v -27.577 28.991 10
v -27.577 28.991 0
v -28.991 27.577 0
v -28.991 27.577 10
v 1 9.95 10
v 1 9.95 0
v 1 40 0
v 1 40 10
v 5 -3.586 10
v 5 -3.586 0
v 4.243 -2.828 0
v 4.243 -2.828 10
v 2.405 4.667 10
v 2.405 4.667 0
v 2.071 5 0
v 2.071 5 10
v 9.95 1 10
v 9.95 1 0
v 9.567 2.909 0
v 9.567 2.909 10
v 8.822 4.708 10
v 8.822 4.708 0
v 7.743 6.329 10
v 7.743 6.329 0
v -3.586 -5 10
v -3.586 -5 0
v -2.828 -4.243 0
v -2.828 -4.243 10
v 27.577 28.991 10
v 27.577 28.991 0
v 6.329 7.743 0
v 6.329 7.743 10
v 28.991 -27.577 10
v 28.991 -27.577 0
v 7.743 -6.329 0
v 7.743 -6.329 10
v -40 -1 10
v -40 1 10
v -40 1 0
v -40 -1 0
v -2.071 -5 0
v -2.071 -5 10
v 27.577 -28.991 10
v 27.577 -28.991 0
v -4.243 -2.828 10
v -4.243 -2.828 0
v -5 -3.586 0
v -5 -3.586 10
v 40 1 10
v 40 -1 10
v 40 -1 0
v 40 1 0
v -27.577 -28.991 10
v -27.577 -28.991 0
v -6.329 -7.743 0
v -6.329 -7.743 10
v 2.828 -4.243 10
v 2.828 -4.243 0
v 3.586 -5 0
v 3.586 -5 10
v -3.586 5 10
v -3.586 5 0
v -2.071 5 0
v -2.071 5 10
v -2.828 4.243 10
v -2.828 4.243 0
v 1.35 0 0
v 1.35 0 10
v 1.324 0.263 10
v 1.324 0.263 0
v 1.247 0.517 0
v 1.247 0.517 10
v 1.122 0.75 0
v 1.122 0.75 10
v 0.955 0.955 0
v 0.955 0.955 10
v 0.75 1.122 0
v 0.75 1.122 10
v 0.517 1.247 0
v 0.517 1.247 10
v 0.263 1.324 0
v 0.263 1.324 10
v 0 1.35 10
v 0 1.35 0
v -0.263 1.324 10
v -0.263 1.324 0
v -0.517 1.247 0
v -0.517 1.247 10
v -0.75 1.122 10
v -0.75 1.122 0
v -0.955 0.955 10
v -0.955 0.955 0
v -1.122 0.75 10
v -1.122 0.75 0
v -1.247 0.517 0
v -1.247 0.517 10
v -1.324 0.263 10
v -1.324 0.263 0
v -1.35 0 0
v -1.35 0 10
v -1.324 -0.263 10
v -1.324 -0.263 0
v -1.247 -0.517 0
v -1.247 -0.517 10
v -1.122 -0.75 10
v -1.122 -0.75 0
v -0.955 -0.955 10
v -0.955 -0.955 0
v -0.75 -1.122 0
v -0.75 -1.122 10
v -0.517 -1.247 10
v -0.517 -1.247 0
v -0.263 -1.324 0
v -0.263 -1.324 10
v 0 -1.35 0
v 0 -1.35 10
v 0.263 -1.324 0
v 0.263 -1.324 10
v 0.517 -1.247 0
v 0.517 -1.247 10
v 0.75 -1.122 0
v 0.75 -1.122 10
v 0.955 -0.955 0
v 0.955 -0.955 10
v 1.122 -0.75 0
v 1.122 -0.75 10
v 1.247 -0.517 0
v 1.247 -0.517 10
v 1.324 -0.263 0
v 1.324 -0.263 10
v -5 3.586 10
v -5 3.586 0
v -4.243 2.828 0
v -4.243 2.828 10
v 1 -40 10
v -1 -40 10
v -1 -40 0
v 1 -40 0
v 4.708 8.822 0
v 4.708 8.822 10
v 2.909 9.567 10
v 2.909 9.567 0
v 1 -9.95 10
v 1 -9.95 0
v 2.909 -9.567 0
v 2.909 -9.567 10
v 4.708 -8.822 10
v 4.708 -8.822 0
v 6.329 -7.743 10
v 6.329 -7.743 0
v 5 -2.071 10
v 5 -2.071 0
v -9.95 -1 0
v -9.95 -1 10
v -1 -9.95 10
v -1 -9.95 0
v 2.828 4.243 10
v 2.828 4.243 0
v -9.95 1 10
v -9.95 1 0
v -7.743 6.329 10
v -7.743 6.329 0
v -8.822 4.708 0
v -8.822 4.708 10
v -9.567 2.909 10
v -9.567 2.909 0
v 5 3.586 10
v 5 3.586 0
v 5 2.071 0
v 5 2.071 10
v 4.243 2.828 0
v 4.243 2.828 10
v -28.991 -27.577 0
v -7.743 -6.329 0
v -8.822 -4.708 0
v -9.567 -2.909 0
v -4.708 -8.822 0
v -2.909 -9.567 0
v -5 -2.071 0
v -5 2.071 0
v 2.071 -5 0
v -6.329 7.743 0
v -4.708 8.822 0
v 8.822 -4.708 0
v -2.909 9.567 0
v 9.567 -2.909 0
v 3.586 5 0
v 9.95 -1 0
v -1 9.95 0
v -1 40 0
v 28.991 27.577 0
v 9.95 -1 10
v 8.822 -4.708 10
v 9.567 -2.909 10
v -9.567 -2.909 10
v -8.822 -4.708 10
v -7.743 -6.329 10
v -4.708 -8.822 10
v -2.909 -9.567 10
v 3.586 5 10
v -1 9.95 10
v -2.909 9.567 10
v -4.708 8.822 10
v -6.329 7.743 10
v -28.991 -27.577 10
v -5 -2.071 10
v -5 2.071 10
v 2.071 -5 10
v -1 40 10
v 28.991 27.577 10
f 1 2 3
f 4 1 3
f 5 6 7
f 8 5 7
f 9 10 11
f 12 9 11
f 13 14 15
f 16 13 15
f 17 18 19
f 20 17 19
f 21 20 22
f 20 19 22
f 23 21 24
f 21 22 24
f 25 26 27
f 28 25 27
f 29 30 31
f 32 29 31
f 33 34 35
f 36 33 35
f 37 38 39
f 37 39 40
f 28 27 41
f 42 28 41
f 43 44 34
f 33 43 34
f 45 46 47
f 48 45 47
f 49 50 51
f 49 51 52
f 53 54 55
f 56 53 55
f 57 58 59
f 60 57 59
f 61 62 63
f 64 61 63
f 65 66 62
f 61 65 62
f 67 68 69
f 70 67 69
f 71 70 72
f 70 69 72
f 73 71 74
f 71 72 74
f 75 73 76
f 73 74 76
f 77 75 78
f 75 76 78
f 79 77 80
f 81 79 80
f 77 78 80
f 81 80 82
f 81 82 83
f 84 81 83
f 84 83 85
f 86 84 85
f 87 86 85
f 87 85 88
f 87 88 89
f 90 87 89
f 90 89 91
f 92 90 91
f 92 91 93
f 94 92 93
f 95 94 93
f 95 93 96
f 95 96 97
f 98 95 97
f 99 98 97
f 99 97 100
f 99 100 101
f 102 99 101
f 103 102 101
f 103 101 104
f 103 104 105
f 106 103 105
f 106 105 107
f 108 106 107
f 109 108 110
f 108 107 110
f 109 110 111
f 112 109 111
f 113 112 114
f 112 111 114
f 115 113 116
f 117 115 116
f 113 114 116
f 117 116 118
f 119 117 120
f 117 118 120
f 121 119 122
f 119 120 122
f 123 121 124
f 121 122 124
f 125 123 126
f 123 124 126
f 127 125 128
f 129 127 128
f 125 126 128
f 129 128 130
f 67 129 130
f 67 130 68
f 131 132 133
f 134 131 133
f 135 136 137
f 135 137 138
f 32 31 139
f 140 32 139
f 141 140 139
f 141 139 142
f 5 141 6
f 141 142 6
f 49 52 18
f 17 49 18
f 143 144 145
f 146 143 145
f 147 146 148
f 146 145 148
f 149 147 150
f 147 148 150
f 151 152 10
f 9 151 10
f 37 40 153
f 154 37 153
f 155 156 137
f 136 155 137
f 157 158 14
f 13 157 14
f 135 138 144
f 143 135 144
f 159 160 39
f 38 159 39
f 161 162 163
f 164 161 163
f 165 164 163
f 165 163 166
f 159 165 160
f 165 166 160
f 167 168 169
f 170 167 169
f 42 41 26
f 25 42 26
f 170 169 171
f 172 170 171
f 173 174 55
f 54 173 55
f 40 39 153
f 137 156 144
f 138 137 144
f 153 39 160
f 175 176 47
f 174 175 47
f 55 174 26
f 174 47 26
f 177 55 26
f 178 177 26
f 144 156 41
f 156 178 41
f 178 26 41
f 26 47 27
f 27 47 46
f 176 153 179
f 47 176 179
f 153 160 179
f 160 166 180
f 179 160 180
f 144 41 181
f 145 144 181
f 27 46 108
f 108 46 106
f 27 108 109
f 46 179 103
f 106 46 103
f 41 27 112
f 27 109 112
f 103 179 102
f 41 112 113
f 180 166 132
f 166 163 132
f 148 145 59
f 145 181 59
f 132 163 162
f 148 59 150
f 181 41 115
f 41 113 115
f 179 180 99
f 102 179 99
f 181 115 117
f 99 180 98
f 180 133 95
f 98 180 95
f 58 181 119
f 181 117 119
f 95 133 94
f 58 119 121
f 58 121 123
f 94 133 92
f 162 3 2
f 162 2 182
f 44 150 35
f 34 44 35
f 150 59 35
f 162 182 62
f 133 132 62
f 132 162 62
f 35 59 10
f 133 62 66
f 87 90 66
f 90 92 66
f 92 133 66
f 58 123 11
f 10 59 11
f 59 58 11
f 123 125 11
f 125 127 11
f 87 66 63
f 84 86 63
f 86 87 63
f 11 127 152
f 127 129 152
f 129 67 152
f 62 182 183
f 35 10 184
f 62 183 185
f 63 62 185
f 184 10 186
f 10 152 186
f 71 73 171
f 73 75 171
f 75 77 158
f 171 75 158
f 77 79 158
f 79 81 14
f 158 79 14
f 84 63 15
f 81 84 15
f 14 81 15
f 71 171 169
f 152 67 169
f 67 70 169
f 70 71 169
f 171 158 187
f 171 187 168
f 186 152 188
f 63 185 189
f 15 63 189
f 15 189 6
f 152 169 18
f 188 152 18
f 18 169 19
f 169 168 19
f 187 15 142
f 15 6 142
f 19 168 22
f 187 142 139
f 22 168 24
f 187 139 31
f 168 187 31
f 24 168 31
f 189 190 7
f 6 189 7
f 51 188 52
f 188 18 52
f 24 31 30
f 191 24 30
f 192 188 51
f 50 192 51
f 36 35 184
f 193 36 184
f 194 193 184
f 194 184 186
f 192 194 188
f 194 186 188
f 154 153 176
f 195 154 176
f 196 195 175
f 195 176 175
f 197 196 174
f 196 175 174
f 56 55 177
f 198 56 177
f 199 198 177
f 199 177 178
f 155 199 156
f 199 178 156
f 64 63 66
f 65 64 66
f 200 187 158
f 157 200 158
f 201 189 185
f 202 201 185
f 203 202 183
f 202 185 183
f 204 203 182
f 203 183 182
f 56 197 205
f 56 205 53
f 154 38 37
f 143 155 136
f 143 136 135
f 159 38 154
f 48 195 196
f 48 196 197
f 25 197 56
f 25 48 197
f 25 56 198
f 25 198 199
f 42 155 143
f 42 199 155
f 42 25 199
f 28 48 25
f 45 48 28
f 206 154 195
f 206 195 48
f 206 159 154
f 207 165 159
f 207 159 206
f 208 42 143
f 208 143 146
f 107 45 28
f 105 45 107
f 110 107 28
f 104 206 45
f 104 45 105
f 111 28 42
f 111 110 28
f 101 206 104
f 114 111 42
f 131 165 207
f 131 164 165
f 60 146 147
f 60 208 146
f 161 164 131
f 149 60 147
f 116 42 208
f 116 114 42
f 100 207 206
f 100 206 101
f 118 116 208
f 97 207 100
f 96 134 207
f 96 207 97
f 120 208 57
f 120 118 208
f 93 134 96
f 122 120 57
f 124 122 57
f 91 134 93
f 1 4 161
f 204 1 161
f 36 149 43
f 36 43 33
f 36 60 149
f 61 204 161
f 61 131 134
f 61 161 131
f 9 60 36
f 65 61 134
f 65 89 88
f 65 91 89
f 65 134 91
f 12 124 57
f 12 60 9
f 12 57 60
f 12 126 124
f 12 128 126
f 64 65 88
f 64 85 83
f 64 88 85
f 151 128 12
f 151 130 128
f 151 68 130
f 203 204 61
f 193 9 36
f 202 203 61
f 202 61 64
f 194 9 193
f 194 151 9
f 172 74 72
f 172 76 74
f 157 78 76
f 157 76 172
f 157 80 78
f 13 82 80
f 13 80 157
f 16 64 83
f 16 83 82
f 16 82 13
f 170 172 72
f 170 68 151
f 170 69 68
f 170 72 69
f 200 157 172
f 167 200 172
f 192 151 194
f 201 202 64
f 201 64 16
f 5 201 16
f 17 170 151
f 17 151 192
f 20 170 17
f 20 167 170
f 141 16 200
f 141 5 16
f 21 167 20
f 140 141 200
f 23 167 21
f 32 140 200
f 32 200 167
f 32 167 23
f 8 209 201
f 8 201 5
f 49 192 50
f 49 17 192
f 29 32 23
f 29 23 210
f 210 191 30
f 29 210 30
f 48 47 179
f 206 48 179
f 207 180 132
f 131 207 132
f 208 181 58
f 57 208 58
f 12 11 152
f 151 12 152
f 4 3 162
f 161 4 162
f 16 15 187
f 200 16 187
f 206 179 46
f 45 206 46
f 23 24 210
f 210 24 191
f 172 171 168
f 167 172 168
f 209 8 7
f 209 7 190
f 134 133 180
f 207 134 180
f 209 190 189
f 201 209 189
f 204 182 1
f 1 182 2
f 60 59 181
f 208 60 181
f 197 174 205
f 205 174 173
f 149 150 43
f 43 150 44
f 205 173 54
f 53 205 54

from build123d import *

# Parameters (mm, degrees)
F3_DEPTH = 10
F4_DEPTH = 10
F5_R     = 1.35
F6_DEPTH = 25


with BuildPart() as f3:
    # F2 (on Top) → F3 (new body)
    with BuildSketch(Plane.XY):
        Polygon((-2.9411380965, 1.5269245341), (-4.2426406871, 2.8284271247), (-7.0710678119, 0), (-5.7695652212, -1.3015025906), align=None)
        Polygon((-28.9913780286, 27.5771644663), (-4.2426406871, 2.8284271247), (-3.5355339059, 3.5355339059), (-2.8284271247, 4.2426406871), (-27.5771644663, 28.9913780286), align=None)
        Polygon((-3.5355339059, 3.5355339059), (-4.2426406871, 2.8284271247), (-2.9411380965, 1.5269245341), (-5.7695652212, -1.3015025906), (-4.2426406871, -2.8284271247), (-3.5355339059, -3.5355339059), (0, 0), align=None)
        Polygon((-2.8284271247, 4.2426406871), (-3.5355339059, 3.5355339059), (0, 0), (3.5355339059, 3.5355339059), (2.8284271247, 4.2426406871), (2.4045457253, 4.6665220865), (-0.4238813994, 1.8380949618), align=None)
        Polygon((0, 7.0710678119), (-2.8284271247, 4.2426406871), (-0.4238813994, 1.8380949618), (2.4045457253, 4.6665220865), align=None)
        Polygon((3.5355339059, 3.5355339059), (0, 0), (3.5355339059, -3.5355339059), (4.2426406871, -2.8284271247), (7.0710678119, 0), (4.2426406871, 2.8284271247), align=None)
        Polygon((3.5355339059, -3.5355339059), (0, 0), (-3.5355339059, -3.5355339059), (-2.8284271247, -4.2426406871), (0, -7.0710678119), (2.8284271247, -4.2426406871), align=None)
        Polygon((-3.5355339059, -3.5355339059), (-4.2426406871, -2.8284271247), (-28.9913780286, -27.5771644663), (-27.5771644663, -28.9913780286), (-2.8284271247, -4.2426406871), align=None)
        Polygon((4.2426406871, -2.8284271247), (3.5355339059, -3.5355339059), (2.8284271247, -4.2426406871), (27.5771644663, -28.9913780286), (28.9913780286, -27.5771644663), align=None)
        Polygon((2.8284271247, 4.2426406871), (3.5355339059, 3.5355339059), (4.2426406871, 2.8284271247), (28.9913780286, 27.5771644663), (27.5771644663, 28.9913780286), align=None)
    extrude(amount=F3_DEPTH)

    # F1 (on Top) → F4 (join)
    with BuildSketch(Plane.XY):
        with BuildLine():
            ThreePointArc((9.9498743711, -1), (9.9874607311, -0.5006277506), (10, 0))
            ThreePointArc((10, 0), (9.9874607311, 0.5006277506), (9.9498743711, 1))
            Line((9.9498743711, 1), (5, 1))
            Line((5, 1), (5, 0))
            Line((5, 0), (5, -1))
            Line((5, -1), (9.9498743711, -1))
        make_face()
        with BuildLine():
            ThreePointArc((9.9498743711, 1), (9.9874607311, 0.5006277506), (10, 0))
            ThreePointArc((10, 0), (9.9874607311, -0.5006277506), (9.9498743711, -1))
            Line((9.9498743711, -1), (40, -1))
            Line((40, -1), (40, 1))
            Line((40, 1), (9.9498743711, 1))
        make_face()
        with BuildLine():
            Line((5, 1), (9.9498743711, 1))
            ThreePointArc((9.9498743711, 1), (7.0710678119, 7.0710678119), (1, 9.9498743711))
            Line((1, 9.9498743711), (1, 5))
            Line((1, 5), (5, 5))
            Line((5, 5), (5, 1))
        make_face()
        with BuildLine():
            ThreePointArc((1, -9.9498743711), (7.0710678119, -7.0710678119), (9.9498743711, -1))
            Line((9.9498743711, -1), (5, -1))
            Line((5, -1), (5, -5))
            Line((5, -5), (1, -5))
            Line((1, -5), (1, -9.9498743711))
        make_face()
        with BuildLine():
            Line((1, 5), (1, 9.9498743711))
            ThreePointArc((1, 9.9498743711), (0, 10), (-1, 9.9498743711))
            Line((-1, 9.9498743711), (-1, 5))
            Line((-1, 5), (0, 5))
            Line((0, 5), (1, 5))
        make_face()
        with BuildLine():
            ThreePointArc((-1, 9.9498743711), (0, 10), (1, 9.9498743711))
            Line((1, 9.9498743711), (1, 40))
            Line((1, 40), (-1, 40))
            Line((-1, 40), (-1, 9.9498743711))
        make_face()
        with BuildLine():
            Line((1, -40), (1, -9.9498743711))
            ThreePointArc((1, -9.9498743711), (0, -10), (-1, -9.9498743711))
            Line((-1, -9.9498743711), (-1, -40))
            Line((-1, -40), (1, -40))
        make_face()
        with BuildLine():
            ThreePointArc((-1, -9.9498743711), (0, -10), (1, -9.9498743711))
            Line((1, -9.9498743711), (1, -5))
            Line((1, -5), (-1, -5))
            Line((-1, -5), (-1, -9.9498743711))
        make_face()
        with BuildLine():
            Line((-1, 5), (-1, 9.9498743711))
            ThreePointArc((-1, 9.9498743711), (-7.0710678119, 7.0710678119), (-9.9498743711, 1))
            Line((-9.9498743711, 1), (-5, 1))
            Line((-5, 1), (-5, 5))
            Line((-5, 5), (-1, 5))
        make_face()
        with BuildLine():
            ThreePointArc((-9.9498743711, -1), (-7.0710678119, -7.0710678119), (-1, -9.9498743711))
            Line((-1, -9.9498743711), (-1, -5))
            Line((-1, -5), (-5, -5))
            Line((-5, -5), (-5, -1))
            Line((-5, -1), (-9.9498743711, -1))
        make_face()
        with BuildLine():
            Line((-5, 1), (-9.9498743711, 1))
            ThreePointArc((-9.9498743711, 1), (-10, 0), (-9.9498743711, -1))
            Line((-9.9498743711, -1), (-5, -1))
            Line((-5, -1), (-5, 0))
            Line((-5, 0), (-5, 1))
        make_face()
        with BuildLine():
            ThreePointArc((-9.9498743711, -1), (-10, 0), (-9.9498743711, 1))
            Line((-9.9498743711, 1), (-40, 1))
            Line((-40, 1), (-40, -1))
            Line((-40, -1), (-9.9498743711, -1))
        make_face()
    extrude(amount=F4_DEPTH)

    # F5 (on face) → F6 (cut)
    with BuildSketch(Plane.XY.offset(10)):
        Circle(F5_R)
    extrude(amount=-F6_DEPTH, mode=Mode.SUBTRACT)


solid = f3.part
